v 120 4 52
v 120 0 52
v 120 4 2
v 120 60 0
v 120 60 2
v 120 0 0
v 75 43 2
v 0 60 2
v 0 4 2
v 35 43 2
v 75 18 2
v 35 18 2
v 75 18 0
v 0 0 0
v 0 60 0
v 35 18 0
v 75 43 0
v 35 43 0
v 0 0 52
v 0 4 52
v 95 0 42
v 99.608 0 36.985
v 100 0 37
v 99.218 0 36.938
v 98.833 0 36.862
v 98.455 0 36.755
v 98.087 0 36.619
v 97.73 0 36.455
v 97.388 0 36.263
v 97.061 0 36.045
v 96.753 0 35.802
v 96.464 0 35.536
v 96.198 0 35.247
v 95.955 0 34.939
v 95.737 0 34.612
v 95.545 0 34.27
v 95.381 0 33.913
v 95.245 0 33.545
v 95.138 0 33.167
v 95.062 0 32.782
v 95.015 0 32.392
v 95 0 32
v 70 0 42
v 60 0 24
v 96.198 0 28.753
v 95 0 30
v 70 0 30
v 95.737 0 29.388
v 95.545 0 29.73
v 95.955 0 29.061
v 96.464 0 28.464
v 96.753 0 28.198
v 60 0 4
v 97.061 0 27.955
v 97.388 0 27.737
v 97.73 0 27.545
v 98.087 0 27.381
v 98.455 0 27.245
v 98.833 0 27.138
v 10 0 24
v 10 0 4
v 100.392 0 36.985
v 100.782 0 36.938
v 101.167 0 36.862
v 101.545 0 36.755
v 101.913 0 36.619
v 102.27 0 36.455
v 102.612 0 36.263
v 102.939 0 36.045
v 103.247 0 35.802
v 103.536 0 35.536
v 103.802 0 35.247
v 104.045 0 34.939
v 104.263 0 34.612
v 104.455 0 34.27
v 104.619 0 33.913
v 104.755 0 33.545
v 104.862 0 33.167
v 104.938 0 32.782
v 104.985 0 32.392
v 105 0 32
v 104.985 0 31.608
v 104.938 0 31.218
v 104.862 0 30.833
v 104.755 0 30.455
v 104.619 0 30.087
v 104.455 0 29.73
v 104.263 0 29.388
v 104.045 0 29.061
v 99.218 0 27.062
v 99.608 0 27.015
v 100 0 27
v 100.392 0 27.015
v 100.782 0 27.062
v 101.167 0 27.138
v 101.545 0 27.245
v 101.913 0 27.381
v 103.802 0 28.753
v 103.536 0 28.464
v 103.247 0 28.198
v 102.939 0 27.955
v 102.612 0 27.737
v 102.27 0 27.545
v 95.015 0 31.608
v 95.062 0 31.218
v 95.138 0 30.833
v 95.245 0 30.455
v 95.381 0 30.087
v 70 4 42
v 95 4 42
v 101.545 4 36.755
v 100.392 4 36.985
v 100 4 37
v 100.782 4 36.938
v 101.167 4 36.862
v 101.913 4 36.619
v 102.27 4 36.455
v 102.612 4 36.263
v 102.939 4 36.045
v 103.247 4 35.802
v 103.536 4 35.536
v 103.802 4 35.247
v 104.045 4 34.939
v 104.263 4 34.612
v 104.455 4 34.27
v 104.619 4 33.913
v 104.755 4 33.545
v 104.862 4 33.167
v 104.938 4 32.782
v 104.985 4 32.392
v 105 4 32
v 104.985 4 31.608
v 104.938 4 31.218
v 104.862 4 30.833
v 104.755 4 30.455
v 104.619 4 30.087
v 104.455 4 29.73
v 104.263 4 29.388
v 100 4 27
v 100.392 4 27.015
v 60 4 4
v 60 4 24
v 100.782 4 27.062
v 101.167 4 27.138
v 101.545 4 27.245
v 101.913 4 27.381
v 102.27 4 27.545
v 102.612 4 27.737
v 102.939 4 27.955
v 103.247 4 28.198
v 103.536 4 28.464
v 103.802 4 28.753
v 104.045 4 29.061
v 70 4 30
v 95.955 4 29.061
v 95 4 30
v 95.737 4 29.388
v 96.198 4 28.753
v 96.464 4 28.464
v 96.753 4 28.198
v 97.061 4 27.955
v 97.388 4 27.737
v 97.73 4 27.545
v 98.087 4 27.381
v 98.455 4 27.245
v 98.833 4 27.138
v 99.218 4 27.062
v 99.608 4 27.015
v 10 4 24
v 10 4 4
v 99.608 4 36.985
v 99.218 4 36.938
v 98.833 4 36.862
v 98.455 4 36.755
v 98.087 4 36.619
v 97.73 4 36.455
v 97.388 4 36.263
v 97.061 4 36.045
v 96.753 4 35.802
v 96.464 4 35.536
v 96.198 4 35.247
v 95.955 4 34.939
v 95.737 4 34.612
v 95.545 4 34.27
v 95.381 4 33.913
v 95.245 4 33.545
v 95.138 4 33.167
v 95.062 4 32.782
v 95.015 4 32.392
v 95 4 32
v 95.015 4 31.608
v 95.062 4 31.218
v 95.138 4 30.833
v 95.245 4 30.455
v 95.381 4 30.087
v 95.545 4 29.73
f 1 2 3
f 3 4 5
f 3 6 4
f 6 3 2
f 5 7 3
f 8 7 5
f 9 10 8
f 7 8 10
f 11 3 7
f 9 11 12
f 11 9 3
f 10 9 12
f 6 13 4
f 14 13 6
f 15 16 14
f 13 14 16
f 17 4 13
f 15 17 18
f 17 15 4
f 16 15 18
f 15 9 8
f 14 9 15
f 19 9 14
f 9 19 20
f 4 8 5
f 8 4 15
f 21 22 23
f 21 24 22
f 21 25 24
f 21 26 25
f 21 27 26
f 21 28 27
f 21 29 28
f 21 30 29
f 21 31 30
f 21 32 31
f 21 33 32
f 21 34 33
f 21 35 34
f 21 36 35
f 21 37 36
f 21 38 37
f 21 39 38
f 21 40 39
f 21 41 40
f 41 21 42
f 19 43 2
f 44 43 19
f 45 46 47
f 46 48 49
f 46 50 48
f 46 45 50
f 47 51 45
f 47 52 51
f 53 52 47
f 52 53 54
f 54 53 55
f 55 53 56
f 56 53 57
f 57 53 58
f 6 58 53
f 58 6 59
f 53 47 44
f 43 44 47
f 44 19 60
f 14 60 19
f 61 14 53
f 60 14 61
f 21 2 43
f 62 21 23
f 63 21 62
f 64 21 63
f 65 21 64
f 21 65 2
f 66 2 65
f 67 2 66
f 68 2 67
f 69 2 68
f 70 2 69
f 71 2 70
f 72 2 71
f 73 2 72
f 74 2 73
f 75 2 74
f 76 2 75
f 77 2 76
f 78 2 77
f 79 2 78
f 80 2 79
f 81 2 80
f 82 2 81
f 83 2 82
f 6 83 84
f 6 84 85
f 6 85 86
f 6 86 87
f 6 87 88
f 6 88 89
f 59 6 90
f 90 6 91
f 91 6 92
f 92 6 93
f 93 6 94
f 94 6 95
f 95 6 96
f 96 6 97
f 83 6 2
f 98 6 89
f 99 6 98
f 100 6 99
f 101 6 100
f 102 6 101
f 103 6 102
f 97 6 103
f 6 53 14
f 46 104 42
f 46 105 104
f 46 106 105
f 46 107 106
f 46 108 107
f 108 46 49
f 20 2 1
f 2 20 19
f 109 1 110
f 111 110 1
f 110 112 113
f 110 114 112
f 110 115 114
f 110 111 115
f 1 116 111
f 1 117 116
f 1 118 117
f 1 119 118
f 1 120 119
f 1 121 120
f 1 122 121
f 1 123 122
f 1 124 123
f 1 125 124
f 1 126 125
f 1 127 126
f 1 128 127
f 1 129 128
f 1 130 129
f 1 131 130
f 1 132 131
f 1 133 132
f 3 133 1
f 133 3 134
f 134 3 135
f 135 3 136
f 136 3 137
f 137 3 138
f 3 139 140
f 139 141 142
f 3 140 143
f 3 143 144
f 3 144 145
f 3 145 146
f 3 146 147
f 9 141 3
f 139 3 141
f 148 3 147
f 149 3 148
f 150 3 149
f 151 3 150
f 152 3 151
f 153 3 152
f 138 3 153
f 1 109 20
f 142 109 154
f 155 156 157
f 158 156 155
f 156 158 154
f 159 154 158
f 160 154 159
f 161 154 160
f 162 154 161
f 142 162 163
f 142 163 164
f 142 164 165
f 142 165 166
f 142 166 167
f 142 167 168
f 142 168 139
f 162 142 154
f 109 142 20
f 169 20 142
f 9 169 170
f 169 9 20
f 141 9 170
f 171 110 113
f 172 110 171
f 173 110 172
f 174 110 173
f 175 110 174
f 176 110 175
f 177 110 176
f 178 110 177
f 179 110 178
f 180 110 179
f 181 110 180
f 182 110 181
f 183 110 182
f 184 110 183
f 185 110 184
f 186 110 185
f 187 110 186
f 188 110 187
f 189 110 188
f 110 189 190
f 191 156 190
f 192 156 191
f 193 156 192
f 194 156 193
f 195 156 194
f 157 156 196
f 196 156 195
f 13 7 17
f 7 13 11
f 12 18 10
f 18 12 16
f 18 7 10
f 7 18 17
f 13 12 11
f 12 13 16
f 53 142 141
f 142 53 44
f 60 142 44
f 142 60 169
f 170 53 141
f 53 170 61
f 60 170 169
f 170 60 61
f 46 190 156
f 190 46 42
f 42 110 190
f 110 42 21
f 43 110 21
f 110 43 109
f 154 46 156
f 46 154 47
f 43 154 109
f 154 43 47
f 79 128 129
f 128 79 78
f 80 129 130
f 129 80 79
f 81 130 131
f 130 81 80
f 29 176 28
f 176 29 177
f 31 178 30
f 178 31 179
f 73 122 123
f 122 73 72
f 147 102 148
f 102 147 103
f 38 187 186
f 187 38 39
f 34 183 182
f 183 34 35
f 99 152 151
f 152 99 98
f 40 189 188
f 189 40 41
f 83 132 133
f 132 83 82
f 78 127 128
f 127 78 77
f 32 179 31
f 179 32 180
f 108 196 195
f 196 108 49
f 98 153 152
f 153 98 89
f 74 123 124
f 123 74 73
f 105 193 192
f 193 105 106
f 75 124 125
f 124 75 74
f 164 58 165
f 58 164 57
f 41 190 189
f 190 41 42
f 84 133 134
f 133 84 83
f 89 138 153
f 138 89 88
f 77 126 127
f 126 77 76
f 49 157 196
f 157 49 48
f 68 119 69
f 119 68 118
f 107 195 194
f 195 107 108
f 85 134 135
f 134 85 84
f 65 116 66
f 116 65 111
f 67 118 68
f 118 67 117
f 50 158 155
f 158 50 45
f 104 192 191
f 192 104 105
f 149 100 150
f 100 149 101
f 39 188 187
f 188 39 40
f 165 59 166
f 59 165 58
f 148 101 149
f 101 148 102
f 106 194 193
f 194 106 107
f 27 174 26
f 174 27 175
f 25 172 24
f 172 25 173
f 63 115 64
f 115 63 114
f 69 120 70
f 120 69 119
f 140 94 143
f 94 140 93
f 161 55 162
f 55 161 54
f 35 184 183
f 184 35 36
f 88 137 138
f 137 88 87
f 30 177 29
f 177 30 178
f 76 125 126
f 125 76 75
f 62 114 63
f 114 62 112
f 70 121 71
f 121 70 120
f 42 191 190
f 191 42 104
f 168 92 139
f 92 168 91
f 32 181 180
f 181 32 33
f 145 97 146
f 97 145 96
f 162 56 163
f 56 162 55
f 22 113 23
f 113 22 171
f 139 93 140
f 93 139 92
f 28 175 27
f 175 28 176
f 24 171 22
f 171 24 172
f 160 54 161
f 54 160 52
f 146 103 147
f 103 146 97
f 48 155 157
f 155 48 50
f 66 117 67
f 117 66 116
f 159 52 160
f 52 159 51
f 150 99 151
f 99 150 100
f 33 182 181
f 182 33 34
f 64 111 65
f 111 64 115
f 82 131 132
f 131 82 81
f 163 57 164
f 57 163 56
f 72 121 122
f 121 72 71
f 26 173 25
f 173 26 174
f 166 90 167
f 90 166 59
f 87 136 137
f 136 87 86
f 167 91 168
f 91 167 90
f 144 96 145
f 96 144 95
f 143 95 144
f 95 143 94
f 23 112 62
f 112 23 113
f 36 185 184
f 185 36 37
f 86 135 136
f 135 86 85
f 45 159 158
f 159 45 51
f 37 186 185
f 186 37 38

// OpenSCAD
// === Parameters ===

// Base sheet dimensions
base_length = 120;       // X extent of the base plate
base_width  = 60;        // Y extent of the base plate
base_thick  = 2;         // Z thickness of the thin sheet

// Upright wall dimensions (along one full edge)
wall_thick  = 4;         // Y thickness of the wall strip
wall_height = 50;        // Z height of the wall above base top face
wall_length = base_length; // wall spans the full edge

// Floor plate rectangular cutout
floor_cut_length = 40;   // X size of floor opening
floor_cut_width  = 25;   // Y size of floor opening
floor_cut_x      = 35;   // X offset from origin to cutout start
floor_cut_y      = 18;   // Y offset from origin to cutout start

// Lower wall rectangular opening (larger, near bottom)
lower_opening_width  = 50;  // X span of lower wall opening
lower_opening_height = 20;  // Z span of lower wall opening
lower_opening_x      = 10;  // X offset from wall left edge
lower_opening_z      = 2;   // Z offset above base top face (near bottom)

// Upper wall rectangular opening (smaller, sits higher)
upper_opening_width  = 25;  // X span of upper wall opening
upper_opening_height = 12;  // Z span of upper wall opening
upper_opening_x      = 70;  // X offset from wall left edge
upper_opening_z      = 28;  // Z offset above base top face (higher up)

// Round through-hole in the wall
hole_diameter = 10;       // Diameter of circular hole
hole_x        = 100;      // X position center of hole
hole_z        = 30;       // Z position center of hole (above base top)

// Resolution
$fn = 80;

// === Modules ===

// Thin rectangular base sheet
module base_sheet() {
    cube([base_length, base_width, base_thick]);
}

// Solid upright wall along one full edge (Y=0 edge)
module upright_wall() {
    // Wall sits on top of the base sheet along the Y=0 edge
    translate([0, 0, base_thick])
        cube([wall_length, wall_thick, wall_height]);
}

// Rectangular cutout through the floor plate
module floor_cutout() {
    translate([floor_cut_x, floor_cut_y, -0.5])
        cube([floor_cut_length, floor_cut_width, base_thick + 1]);
}

// Lower rectangular opening through the wall
module lower_wall_opening() {
    translate([lower_opening_x, -0.5, base_thick + lower_opening_z])
        cube([lower_opening_width, wall_thick + 1, lower_opening_height]);
}

// Upper rectangular opening through the wall
module upper_wall_opening() {
    translate([upper_opening_x, -0.5, base_thick + upper_opening_z])
        cube([upper_opening_width, wall_thick + 1, upper_opening_height]);
}

// Round through-hole in the wall
module wall_hole() {
    translate([hole_x, wall_thick / 2, base_thick + hole_z])
        rotate([0, 0, 0])
        // Hole passes through wall thickness (Y direction)
        translate([0, 0, 0])
            rotate([90, 0, 0])
                cylinder(h = wall_thick + 2, d = hole_diameter, center = true);
}

// === Main Assembly ===

difference() {
    // Solid body: base sheet + upright wall
    union() {
        base_sheet();
        upright_wall();
    }

    // Subtractive features (all voids are removed material)
    floor_cutout();          // Through-cut in floor plate
    lower_wall_opening();    // Large rectangular opening low on wall
    upper_wall_opening();    // Smaller rectangular opening higher on wall
    wall_hole();             // Circular through-hole in wall
}
